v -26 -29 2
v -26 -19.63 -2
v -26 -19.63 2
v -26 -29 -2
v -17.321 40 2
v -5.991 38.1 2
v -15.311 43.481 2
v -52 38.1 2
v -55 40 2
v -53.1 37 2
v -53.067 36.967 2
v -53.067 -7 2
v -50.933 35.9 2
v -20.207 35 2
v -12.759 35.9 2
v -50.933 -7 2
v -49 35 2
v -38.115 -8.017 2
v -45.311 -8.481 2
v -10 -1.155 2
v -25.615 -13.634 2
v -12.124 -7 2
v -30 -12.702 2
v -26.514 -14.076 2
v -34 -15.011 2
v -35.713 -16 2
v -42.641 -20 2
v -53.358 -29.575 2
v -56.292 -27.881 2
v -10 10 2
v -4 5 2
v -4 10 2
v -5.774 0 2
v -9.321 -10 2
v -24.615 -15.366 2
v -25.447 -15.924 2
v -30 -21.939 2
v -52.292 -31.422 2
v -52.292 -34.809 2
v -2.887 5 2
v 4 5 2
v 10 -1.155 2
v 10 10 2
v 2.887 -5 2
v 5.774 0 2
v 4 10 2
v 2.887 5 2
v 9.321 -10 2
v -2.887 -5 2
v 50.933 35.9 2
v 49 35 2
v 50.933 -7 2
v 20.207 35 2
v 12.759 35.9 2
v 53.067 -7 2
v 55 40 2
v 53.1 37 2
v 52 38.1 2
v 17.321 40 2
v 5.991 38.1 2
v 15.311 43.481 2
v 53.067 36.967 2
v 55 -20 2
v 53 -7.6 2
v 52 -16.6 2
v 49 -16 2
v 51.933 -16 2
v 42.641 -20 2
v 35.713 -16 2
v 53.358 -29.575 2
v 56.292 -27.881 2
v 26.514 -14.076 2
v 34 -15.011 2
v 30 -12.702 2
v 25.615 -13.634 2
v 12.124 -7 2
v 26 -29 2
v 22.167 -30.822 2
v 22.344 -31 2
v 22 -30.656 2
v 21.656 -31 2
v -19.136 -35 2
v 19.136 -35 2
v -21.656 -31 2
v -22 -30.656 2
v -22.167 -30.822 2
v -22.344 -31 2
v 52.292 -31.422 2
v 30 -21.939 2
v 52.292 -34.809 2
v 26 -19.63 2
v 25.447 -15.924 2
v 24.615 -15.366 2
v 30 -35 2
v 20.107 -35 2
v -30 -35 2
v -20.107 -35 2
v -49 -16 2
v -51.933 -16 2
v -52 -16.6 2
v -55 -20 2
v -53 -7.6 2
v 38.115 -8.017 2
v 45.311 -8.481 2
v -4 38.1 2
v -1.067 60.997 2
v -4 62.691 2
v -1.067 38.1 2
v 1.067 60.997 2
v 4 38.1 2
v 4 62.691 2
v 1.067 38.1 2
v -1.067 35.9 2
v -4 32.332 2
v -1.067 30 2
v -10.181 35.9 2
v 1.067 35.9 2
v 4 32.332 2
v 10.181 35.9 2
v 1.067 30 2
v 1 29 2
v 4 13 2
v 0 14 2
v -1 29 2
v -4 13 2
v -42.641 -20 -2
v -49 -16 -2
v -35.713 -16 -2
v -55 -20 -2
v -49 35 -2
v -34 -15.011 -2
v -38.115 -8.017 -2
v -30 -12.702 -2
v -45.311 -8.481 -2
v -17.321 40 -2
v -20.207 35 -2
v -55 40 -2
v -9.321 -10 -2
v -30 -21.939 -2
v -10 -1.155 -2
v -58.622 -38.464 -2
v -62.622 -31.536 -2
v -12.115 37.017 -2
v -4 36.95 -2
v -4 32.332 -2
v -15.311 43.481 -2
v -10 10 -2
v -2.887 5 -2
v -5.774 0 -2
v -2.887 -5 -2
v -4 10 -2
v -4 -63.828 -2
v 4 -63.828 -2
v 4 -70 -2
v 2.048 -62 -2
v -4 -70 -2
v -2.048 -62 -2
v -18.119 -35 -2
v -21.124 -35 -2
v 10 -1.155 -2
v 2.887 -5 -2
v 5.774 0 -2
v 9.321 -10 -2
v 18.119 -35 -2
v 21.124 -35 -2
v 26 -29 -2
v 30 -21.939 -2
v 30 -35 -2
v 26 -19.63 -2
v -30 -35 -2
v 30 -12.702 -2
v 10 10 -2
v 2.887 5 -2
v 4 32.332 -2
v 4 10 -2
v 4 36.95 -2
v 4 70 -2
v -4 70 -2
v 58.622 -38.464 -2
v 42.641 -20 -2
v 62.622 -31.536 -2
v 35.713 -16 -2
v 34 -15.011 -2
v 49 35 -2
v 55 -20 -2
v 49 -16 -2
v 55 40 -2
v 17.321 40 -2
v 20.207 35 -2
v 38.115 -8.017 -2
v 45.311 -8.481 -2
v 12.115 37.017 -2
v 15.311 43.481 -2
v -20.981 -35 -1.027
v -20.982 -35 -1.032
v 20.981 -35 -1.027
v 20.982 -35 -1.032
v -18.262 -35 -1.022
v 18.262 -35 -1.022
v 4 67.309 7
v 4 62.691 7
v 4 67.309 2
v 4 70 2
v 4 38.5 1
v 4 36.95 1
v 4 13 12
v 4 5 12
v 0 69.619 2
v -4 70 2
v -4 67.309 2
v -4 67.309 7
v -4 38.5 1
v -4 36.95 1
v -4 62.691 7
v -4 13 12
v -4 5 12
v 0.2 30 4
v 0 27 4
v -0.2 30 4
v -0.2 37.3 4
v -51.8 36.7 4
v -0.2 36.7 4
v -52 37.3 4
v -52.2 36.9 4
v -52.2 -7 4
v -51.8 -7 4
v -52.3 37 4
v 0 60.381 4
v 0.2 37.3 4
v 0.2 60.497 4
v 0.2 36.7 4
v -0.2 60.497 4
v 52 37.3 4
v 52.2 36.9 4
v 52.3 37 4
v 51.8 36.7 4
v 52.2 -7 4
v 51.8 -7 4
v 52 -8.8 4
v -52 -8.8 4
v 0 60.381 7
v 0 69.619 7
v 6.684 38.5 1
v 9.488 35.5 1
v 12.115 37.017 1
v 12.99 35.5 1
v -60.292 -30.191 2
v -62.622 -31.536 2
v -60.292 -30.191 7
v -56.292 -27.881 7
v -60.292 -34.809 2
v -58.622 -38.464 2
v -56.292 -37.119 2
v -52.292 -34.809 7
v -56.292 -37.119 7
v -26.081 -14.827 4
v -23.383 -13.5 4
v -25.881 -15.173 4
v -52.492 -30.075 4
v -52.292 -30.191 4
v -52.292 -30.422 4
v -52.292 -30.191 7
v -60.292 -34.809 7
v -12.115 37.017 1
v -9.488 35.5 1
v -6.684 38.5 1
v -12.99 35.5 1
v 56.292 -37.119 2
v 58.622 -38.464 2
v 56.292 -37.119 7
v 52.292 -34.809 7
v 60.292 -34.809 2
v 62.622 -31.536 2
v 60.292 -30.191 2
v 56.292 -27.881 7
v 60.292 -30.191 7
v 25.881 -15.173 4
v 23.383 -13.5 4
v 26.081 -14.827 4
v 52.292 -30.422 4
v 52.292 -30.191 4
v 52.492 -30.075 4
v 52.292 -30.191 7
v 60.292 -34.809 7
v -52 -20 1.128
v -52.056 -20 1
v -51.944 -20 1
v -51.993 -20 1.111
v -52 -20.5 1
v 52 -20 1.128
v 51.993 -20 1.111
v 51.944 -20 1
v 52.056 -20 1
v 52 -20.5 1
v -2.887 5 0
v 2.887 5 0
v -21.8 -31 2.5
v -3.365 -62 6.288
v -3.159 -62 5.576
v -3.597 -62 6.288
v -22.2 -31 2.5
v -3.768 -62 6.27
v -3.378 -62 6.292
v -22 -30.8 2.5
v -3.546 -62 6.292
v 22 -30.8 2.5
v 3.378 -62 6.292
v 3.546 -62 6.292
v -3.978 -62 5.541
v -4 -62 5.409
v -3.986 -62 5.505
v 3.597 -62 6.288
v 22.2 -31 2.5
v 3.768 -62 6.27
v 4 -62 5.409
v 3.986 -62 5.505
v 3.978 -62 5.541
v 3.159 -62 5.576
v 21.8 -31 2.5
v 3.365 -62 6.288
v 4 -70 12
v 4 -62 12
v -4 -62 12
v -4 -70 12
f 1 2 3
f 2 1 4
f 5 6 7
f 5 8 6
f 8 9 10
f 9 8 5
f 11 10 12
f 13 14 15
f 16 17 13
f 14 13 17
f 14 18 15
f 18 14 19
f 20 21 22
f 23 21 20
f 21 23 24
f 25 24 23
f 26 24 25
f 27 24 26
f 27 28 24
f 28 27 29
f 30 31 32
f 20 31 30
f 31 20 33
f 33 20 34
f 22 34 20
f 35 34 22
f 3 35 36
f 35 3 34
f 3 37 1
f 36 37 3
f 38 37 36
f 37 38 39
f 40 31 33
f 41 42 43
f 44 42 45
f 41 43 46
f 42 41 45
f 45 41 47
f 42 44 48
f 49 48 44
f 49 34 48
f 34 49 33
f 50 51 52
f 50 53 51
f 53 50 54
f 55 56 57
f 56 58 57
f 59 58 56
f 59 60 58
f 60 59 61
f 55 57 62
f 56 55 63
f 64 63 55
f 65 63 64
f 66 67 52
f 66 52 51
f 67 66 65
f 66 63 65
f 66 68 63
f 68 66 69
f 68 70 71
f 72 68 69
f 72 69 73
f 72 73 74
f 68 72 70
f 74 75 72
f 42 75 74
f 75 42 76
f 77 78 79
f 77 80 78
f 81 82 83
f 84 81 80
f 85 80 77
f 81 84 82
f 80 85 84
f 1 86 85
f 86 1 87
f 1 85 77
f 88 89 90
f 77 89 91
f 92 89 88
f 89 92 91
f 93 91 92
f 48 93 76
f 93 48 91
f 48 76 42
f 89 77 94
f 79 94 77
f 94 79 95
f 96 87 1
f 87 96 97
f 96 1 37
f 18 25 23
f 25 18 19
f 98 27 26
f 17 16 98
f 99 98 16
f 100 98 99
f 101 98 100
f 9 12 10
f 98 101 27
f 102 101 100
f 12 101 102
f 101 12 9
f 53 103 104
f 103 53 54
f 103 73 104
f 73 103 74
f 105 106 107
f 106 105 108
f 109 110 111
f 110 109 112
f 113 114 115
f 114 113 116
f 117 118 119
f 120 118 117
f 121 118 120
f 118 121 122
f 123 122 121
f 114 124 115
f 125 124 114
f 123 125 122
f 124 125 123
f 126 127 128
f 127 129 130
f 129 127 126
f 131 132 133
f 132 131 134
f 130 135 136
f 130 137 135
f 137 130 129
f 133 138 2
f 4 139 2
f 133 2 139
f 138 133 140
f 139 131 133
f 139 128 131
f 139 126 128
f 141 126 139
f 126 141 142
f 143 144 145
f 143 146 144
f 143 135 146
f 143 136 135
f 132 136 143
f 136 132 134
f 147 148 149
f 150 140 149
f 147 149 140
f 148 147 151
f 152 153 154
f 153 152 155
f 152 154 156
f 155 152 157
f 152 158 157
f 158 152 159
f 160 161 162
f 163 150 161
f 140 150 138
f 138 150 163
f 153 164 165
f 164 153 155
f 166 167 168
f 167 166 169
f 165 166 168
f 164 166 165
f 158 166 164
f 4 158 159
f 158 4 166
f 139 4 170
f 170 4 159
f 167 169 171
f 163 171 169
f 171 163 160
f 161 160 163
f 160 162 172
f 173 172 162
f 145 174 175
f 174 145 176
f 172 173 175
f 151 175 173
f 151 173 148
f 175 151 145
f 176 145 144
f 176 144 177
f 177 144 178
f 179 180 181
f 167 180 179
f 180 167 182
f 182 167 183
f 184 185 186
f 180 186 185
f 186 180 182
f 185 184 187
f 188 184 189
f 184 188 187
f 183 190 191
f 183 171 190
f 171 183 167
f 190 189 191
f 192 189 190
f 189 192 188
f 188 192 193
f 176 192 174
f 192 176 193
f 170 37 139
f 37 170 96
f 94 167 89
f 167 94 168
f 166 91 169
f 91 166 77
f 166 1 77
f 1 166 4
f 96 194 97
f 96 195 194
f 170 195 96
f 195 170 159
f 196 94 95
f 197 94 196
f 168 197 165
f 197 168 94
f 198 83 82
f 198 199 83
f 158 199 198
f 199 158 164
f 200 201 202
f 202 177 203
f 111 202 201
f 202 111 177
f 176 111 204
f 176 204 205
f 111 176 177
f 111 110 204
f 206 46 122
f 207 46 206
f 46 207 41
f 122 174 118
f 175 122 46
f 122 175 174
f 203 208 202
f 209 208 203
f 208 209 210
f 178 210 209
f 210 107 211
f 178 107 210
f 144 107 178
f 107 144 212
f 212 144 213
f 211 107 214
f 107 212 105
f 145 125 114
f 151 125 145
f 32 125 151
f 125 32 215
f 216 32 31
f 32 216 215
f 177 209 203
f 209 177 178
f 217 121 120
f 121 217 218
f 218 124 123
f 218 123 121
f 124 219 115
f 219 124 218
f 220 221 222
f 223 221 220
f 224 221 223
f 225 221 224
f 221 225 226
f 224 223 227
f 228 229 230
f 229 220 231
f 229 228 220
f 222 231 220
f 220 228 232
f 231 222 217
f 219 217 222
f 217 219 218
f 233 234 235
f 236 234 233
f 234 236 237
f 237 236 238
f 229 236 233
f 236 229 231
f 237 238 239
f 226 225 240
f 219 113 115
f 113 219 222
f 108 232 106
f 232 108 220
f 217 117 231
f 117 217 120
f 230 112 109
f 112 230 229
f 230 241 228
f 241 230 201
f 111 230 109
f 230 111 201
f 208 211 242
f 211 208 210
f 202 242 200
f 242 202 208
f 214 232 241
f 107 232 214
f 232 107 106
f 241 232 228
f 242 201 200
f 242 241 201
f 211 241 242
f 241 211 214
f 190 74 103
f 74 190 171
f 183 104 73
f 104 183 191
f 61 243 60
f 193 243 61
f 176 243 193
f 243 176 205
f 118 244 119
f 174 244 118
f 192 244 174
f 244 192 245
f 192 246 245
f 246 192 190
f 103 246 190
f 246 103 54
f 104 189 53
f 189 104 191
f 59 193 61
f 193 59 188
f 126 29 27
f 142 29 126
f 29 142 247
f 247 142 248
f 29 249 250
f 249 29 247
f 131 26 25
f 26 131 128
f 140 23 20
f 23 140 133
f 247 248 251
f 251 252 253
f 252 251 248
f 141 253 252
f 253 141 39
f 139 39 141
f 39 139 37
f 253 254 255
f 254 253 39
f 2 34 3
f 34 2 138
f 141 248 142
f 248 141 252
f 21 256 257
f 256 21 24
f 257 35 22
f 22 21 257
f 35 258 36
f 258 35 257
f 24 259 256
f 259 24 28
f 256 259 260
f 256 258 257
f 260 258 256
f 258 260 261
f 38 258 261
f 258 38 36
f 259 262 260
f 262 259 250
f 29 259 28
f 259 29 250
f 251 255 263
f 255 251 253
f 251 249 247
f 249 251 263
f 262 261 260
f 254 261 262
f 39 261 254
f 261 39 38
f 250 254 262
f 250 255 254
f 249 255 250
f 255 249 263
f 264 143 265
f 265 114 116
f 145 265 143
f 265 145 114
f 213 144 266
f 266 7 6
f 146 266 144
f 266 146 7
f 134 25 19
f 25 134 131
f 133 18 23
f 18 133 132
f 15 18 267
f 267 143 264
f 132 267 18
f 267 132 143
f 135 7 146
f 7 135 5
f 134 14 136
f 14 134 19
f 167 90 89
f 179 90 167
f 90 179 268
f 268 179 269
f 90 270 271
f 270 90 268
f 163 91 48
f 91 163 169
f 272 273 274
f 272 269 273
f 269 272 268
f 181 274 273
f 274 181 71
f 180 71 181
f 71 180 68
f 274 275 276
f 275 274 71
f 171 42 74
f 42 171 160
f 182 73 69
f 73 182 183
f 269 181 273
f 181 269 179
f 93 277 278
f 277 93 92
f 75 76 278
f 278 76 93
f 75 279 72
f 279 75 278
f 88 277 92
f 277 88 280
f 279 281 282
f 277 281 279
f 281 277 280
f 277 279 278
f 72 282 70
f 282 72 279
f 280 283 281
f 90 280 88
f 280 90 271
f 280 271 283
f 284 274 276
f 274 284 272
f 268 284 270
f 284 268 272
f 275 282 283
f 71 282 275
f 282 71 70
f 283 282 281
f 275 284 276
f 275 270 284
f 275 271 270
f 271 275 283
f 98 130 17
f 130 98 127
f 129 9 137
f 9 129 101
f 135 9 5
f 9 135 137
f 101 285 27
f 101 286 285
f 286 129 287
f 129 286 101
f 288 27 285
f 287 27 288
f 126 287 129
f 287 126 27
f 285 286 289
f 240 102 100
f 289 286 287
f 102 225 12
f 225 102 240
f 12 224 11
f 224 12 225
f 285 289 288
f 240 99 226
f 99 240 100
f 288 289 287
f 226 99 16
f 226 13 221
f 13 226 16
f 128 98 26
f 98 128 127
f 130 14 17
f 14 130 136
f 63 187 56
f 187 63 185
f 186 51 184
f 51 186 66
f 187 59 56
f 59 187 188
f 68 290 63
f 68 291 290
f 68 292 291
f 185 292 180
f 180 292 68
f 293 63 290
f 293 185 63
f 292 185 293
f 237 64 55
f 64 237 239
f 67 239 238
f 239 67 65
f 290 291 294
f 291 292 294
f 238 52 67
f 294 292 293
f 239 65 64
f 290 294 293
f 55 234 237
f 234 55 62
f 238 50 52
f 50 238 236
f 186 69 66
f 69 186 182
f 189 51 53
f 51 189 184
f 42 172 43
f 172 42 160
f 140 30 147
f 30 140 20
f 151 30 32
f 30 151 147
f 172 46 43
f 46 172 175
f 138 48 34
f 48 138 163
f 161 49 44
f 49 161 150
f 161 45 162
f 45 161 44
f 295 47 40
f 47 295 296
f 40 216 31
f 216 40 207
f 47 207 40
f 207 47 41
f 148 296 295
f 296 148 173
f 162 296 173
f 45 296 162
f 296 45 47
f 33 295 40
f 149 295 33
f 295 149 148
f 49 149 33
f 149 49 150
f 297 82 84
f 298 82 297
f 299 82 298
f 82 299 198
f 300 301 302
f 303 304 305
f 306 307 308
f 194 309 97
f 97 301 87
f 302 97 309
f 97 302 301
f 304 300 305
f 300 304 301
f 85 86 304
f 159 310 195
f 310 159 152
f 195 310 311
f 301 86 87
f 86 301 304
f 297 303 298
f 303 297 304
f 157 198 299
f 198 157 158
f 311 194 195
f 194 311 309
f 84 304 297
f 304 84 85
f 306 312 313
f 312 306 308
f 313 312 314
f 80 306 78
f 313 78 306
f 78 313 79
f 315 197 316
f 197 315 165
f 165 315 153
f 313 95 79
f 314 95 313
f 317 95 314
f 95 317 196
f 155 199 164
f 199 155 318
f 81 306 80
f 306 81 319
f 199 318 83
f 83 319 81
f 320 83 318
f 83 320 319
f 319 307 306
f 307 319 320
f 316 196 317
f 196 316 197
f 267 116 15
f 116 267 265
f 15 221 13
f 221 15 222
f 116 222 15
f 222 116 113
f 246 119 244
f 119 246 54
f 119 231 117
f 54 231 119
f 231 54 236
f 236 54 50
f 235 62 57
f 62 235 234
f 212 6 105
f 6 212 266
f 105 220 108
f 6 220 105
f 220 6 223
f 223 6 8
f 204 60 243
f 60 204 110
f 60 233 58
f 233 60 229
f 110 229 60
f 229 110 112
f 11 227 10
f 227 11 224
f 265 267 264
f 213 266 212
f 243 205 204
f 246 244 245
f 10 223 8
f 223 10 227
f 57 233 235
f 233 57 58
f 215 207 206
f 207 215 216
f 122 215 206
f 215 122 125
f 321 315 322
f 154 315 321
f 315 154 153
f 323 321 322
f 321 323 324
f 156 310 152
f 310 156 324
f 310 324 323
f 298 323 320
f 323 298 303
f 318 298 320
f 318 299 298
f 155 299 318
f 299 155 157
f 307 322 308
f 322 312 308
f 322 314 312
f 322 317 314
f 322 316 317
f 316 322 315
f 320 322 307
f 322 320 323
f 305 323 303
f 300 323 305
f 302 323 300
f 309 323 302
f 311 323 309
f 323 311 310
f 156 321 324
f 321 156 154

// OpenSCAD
//projection(cut=true)  // to make annotated 2D drawing
union() {

  for (a=[0,120,240]) rotate([0,0,a]) {
    // tip 39+62/2 = 70 mm from exact center
    translate([0, 39,0]) cube([8,62,4],center=true);
    hull() {  // support brace
      translate([0,30,1]) scale([1,15,1]) cylinder(r1=1.5,r2=.2,h=3,$fn=4);
      translate([0,63,1])                 cylinder(r1=1.5,r2=.2,h=3,$fn=4);
    }
    // outer edge aligned with center of tip of bar towards tower,
    // exactly 35mm from center
    translate([0,-32,0]) {
      cube([60,6,4],center=true);
      for (b=[-1,1]) 
        translate([28*b,8,0]) cube([4,15,4],center=true);
    }

    // more stuff to test Z scale
    // corners exactly 60 from center, on outside, 5mm above rest.
    translate([0,65,0]) rotate([0,0,30]) cylinder(r=4/cos(30),h=2+5,$fn=6);
  }

  // more XY-square parts to test straight lines/squareness
  for(a=[-1,1]) {
    translate([52*a, 10  ,0]) cube([ 6,60,4],center=true);
    translate([52*a,  0  ,1]) hull() { // support brace
      translate([0,37,0]) cylinder(r1=1.5,r2=.2,h=3,$fn=4);
      translate([0,-7,0]) scale([1,9,1]) cylinder(r1=1.5,r2=.2,h=3,$fn=4);
    }
    translate([43*a,-18  ,0]) cube([16, 4,4],center=true);
    translate([34*a, 37.5,0]) cube([35, 5,4],center=true);
  }
  translate([ 0  , 37  ,1]) hull() { // more braces
    for (a=[-1,1]) translate([ 52*a,0,0])
      cylinder(r1=1.5,r2=.3,h=3,$fn=4);
  }

  difference() {
    //cube([20/cos(30),20,4],center=true);
    cube([20,20,4],center=true);
    translate([0,0,-3]) cylinder(h=6,r=5/cos(30),$fn=6);  // 1cm wide hex, marks center
  }

  // more z-scale tests
  translate([0,5+4,12/2]) cube([8,8,12],center=true);

  // This little post ensures that slic3r puts drawing centered correctly,
  // without manual 15.768 mm offset.
  // I also had problems with re-melt when printing one tall spire.
  // this will force the head to move on each layer and give things more time
  // to cool
  translate([0,-70+4,5]) cube([8,8,14],center=true);
  for(a=[-1,1]) hull() {
    translate([22*a,-31,-2]) cylinder(r1=1.5,r2=.2,h=4.5,$fn=4);
    translate([  0 ,-68,-2]) cylinder(r1=1.5,r2=.2,h=9,$fn=6);
  }
}

%translate([0,0,-1]) rotate([0,0,30]) cylinder(h=2,r=70,$fn=6);
//translate([0,-30,6]) %cube([120.584,3,3],center=true);
